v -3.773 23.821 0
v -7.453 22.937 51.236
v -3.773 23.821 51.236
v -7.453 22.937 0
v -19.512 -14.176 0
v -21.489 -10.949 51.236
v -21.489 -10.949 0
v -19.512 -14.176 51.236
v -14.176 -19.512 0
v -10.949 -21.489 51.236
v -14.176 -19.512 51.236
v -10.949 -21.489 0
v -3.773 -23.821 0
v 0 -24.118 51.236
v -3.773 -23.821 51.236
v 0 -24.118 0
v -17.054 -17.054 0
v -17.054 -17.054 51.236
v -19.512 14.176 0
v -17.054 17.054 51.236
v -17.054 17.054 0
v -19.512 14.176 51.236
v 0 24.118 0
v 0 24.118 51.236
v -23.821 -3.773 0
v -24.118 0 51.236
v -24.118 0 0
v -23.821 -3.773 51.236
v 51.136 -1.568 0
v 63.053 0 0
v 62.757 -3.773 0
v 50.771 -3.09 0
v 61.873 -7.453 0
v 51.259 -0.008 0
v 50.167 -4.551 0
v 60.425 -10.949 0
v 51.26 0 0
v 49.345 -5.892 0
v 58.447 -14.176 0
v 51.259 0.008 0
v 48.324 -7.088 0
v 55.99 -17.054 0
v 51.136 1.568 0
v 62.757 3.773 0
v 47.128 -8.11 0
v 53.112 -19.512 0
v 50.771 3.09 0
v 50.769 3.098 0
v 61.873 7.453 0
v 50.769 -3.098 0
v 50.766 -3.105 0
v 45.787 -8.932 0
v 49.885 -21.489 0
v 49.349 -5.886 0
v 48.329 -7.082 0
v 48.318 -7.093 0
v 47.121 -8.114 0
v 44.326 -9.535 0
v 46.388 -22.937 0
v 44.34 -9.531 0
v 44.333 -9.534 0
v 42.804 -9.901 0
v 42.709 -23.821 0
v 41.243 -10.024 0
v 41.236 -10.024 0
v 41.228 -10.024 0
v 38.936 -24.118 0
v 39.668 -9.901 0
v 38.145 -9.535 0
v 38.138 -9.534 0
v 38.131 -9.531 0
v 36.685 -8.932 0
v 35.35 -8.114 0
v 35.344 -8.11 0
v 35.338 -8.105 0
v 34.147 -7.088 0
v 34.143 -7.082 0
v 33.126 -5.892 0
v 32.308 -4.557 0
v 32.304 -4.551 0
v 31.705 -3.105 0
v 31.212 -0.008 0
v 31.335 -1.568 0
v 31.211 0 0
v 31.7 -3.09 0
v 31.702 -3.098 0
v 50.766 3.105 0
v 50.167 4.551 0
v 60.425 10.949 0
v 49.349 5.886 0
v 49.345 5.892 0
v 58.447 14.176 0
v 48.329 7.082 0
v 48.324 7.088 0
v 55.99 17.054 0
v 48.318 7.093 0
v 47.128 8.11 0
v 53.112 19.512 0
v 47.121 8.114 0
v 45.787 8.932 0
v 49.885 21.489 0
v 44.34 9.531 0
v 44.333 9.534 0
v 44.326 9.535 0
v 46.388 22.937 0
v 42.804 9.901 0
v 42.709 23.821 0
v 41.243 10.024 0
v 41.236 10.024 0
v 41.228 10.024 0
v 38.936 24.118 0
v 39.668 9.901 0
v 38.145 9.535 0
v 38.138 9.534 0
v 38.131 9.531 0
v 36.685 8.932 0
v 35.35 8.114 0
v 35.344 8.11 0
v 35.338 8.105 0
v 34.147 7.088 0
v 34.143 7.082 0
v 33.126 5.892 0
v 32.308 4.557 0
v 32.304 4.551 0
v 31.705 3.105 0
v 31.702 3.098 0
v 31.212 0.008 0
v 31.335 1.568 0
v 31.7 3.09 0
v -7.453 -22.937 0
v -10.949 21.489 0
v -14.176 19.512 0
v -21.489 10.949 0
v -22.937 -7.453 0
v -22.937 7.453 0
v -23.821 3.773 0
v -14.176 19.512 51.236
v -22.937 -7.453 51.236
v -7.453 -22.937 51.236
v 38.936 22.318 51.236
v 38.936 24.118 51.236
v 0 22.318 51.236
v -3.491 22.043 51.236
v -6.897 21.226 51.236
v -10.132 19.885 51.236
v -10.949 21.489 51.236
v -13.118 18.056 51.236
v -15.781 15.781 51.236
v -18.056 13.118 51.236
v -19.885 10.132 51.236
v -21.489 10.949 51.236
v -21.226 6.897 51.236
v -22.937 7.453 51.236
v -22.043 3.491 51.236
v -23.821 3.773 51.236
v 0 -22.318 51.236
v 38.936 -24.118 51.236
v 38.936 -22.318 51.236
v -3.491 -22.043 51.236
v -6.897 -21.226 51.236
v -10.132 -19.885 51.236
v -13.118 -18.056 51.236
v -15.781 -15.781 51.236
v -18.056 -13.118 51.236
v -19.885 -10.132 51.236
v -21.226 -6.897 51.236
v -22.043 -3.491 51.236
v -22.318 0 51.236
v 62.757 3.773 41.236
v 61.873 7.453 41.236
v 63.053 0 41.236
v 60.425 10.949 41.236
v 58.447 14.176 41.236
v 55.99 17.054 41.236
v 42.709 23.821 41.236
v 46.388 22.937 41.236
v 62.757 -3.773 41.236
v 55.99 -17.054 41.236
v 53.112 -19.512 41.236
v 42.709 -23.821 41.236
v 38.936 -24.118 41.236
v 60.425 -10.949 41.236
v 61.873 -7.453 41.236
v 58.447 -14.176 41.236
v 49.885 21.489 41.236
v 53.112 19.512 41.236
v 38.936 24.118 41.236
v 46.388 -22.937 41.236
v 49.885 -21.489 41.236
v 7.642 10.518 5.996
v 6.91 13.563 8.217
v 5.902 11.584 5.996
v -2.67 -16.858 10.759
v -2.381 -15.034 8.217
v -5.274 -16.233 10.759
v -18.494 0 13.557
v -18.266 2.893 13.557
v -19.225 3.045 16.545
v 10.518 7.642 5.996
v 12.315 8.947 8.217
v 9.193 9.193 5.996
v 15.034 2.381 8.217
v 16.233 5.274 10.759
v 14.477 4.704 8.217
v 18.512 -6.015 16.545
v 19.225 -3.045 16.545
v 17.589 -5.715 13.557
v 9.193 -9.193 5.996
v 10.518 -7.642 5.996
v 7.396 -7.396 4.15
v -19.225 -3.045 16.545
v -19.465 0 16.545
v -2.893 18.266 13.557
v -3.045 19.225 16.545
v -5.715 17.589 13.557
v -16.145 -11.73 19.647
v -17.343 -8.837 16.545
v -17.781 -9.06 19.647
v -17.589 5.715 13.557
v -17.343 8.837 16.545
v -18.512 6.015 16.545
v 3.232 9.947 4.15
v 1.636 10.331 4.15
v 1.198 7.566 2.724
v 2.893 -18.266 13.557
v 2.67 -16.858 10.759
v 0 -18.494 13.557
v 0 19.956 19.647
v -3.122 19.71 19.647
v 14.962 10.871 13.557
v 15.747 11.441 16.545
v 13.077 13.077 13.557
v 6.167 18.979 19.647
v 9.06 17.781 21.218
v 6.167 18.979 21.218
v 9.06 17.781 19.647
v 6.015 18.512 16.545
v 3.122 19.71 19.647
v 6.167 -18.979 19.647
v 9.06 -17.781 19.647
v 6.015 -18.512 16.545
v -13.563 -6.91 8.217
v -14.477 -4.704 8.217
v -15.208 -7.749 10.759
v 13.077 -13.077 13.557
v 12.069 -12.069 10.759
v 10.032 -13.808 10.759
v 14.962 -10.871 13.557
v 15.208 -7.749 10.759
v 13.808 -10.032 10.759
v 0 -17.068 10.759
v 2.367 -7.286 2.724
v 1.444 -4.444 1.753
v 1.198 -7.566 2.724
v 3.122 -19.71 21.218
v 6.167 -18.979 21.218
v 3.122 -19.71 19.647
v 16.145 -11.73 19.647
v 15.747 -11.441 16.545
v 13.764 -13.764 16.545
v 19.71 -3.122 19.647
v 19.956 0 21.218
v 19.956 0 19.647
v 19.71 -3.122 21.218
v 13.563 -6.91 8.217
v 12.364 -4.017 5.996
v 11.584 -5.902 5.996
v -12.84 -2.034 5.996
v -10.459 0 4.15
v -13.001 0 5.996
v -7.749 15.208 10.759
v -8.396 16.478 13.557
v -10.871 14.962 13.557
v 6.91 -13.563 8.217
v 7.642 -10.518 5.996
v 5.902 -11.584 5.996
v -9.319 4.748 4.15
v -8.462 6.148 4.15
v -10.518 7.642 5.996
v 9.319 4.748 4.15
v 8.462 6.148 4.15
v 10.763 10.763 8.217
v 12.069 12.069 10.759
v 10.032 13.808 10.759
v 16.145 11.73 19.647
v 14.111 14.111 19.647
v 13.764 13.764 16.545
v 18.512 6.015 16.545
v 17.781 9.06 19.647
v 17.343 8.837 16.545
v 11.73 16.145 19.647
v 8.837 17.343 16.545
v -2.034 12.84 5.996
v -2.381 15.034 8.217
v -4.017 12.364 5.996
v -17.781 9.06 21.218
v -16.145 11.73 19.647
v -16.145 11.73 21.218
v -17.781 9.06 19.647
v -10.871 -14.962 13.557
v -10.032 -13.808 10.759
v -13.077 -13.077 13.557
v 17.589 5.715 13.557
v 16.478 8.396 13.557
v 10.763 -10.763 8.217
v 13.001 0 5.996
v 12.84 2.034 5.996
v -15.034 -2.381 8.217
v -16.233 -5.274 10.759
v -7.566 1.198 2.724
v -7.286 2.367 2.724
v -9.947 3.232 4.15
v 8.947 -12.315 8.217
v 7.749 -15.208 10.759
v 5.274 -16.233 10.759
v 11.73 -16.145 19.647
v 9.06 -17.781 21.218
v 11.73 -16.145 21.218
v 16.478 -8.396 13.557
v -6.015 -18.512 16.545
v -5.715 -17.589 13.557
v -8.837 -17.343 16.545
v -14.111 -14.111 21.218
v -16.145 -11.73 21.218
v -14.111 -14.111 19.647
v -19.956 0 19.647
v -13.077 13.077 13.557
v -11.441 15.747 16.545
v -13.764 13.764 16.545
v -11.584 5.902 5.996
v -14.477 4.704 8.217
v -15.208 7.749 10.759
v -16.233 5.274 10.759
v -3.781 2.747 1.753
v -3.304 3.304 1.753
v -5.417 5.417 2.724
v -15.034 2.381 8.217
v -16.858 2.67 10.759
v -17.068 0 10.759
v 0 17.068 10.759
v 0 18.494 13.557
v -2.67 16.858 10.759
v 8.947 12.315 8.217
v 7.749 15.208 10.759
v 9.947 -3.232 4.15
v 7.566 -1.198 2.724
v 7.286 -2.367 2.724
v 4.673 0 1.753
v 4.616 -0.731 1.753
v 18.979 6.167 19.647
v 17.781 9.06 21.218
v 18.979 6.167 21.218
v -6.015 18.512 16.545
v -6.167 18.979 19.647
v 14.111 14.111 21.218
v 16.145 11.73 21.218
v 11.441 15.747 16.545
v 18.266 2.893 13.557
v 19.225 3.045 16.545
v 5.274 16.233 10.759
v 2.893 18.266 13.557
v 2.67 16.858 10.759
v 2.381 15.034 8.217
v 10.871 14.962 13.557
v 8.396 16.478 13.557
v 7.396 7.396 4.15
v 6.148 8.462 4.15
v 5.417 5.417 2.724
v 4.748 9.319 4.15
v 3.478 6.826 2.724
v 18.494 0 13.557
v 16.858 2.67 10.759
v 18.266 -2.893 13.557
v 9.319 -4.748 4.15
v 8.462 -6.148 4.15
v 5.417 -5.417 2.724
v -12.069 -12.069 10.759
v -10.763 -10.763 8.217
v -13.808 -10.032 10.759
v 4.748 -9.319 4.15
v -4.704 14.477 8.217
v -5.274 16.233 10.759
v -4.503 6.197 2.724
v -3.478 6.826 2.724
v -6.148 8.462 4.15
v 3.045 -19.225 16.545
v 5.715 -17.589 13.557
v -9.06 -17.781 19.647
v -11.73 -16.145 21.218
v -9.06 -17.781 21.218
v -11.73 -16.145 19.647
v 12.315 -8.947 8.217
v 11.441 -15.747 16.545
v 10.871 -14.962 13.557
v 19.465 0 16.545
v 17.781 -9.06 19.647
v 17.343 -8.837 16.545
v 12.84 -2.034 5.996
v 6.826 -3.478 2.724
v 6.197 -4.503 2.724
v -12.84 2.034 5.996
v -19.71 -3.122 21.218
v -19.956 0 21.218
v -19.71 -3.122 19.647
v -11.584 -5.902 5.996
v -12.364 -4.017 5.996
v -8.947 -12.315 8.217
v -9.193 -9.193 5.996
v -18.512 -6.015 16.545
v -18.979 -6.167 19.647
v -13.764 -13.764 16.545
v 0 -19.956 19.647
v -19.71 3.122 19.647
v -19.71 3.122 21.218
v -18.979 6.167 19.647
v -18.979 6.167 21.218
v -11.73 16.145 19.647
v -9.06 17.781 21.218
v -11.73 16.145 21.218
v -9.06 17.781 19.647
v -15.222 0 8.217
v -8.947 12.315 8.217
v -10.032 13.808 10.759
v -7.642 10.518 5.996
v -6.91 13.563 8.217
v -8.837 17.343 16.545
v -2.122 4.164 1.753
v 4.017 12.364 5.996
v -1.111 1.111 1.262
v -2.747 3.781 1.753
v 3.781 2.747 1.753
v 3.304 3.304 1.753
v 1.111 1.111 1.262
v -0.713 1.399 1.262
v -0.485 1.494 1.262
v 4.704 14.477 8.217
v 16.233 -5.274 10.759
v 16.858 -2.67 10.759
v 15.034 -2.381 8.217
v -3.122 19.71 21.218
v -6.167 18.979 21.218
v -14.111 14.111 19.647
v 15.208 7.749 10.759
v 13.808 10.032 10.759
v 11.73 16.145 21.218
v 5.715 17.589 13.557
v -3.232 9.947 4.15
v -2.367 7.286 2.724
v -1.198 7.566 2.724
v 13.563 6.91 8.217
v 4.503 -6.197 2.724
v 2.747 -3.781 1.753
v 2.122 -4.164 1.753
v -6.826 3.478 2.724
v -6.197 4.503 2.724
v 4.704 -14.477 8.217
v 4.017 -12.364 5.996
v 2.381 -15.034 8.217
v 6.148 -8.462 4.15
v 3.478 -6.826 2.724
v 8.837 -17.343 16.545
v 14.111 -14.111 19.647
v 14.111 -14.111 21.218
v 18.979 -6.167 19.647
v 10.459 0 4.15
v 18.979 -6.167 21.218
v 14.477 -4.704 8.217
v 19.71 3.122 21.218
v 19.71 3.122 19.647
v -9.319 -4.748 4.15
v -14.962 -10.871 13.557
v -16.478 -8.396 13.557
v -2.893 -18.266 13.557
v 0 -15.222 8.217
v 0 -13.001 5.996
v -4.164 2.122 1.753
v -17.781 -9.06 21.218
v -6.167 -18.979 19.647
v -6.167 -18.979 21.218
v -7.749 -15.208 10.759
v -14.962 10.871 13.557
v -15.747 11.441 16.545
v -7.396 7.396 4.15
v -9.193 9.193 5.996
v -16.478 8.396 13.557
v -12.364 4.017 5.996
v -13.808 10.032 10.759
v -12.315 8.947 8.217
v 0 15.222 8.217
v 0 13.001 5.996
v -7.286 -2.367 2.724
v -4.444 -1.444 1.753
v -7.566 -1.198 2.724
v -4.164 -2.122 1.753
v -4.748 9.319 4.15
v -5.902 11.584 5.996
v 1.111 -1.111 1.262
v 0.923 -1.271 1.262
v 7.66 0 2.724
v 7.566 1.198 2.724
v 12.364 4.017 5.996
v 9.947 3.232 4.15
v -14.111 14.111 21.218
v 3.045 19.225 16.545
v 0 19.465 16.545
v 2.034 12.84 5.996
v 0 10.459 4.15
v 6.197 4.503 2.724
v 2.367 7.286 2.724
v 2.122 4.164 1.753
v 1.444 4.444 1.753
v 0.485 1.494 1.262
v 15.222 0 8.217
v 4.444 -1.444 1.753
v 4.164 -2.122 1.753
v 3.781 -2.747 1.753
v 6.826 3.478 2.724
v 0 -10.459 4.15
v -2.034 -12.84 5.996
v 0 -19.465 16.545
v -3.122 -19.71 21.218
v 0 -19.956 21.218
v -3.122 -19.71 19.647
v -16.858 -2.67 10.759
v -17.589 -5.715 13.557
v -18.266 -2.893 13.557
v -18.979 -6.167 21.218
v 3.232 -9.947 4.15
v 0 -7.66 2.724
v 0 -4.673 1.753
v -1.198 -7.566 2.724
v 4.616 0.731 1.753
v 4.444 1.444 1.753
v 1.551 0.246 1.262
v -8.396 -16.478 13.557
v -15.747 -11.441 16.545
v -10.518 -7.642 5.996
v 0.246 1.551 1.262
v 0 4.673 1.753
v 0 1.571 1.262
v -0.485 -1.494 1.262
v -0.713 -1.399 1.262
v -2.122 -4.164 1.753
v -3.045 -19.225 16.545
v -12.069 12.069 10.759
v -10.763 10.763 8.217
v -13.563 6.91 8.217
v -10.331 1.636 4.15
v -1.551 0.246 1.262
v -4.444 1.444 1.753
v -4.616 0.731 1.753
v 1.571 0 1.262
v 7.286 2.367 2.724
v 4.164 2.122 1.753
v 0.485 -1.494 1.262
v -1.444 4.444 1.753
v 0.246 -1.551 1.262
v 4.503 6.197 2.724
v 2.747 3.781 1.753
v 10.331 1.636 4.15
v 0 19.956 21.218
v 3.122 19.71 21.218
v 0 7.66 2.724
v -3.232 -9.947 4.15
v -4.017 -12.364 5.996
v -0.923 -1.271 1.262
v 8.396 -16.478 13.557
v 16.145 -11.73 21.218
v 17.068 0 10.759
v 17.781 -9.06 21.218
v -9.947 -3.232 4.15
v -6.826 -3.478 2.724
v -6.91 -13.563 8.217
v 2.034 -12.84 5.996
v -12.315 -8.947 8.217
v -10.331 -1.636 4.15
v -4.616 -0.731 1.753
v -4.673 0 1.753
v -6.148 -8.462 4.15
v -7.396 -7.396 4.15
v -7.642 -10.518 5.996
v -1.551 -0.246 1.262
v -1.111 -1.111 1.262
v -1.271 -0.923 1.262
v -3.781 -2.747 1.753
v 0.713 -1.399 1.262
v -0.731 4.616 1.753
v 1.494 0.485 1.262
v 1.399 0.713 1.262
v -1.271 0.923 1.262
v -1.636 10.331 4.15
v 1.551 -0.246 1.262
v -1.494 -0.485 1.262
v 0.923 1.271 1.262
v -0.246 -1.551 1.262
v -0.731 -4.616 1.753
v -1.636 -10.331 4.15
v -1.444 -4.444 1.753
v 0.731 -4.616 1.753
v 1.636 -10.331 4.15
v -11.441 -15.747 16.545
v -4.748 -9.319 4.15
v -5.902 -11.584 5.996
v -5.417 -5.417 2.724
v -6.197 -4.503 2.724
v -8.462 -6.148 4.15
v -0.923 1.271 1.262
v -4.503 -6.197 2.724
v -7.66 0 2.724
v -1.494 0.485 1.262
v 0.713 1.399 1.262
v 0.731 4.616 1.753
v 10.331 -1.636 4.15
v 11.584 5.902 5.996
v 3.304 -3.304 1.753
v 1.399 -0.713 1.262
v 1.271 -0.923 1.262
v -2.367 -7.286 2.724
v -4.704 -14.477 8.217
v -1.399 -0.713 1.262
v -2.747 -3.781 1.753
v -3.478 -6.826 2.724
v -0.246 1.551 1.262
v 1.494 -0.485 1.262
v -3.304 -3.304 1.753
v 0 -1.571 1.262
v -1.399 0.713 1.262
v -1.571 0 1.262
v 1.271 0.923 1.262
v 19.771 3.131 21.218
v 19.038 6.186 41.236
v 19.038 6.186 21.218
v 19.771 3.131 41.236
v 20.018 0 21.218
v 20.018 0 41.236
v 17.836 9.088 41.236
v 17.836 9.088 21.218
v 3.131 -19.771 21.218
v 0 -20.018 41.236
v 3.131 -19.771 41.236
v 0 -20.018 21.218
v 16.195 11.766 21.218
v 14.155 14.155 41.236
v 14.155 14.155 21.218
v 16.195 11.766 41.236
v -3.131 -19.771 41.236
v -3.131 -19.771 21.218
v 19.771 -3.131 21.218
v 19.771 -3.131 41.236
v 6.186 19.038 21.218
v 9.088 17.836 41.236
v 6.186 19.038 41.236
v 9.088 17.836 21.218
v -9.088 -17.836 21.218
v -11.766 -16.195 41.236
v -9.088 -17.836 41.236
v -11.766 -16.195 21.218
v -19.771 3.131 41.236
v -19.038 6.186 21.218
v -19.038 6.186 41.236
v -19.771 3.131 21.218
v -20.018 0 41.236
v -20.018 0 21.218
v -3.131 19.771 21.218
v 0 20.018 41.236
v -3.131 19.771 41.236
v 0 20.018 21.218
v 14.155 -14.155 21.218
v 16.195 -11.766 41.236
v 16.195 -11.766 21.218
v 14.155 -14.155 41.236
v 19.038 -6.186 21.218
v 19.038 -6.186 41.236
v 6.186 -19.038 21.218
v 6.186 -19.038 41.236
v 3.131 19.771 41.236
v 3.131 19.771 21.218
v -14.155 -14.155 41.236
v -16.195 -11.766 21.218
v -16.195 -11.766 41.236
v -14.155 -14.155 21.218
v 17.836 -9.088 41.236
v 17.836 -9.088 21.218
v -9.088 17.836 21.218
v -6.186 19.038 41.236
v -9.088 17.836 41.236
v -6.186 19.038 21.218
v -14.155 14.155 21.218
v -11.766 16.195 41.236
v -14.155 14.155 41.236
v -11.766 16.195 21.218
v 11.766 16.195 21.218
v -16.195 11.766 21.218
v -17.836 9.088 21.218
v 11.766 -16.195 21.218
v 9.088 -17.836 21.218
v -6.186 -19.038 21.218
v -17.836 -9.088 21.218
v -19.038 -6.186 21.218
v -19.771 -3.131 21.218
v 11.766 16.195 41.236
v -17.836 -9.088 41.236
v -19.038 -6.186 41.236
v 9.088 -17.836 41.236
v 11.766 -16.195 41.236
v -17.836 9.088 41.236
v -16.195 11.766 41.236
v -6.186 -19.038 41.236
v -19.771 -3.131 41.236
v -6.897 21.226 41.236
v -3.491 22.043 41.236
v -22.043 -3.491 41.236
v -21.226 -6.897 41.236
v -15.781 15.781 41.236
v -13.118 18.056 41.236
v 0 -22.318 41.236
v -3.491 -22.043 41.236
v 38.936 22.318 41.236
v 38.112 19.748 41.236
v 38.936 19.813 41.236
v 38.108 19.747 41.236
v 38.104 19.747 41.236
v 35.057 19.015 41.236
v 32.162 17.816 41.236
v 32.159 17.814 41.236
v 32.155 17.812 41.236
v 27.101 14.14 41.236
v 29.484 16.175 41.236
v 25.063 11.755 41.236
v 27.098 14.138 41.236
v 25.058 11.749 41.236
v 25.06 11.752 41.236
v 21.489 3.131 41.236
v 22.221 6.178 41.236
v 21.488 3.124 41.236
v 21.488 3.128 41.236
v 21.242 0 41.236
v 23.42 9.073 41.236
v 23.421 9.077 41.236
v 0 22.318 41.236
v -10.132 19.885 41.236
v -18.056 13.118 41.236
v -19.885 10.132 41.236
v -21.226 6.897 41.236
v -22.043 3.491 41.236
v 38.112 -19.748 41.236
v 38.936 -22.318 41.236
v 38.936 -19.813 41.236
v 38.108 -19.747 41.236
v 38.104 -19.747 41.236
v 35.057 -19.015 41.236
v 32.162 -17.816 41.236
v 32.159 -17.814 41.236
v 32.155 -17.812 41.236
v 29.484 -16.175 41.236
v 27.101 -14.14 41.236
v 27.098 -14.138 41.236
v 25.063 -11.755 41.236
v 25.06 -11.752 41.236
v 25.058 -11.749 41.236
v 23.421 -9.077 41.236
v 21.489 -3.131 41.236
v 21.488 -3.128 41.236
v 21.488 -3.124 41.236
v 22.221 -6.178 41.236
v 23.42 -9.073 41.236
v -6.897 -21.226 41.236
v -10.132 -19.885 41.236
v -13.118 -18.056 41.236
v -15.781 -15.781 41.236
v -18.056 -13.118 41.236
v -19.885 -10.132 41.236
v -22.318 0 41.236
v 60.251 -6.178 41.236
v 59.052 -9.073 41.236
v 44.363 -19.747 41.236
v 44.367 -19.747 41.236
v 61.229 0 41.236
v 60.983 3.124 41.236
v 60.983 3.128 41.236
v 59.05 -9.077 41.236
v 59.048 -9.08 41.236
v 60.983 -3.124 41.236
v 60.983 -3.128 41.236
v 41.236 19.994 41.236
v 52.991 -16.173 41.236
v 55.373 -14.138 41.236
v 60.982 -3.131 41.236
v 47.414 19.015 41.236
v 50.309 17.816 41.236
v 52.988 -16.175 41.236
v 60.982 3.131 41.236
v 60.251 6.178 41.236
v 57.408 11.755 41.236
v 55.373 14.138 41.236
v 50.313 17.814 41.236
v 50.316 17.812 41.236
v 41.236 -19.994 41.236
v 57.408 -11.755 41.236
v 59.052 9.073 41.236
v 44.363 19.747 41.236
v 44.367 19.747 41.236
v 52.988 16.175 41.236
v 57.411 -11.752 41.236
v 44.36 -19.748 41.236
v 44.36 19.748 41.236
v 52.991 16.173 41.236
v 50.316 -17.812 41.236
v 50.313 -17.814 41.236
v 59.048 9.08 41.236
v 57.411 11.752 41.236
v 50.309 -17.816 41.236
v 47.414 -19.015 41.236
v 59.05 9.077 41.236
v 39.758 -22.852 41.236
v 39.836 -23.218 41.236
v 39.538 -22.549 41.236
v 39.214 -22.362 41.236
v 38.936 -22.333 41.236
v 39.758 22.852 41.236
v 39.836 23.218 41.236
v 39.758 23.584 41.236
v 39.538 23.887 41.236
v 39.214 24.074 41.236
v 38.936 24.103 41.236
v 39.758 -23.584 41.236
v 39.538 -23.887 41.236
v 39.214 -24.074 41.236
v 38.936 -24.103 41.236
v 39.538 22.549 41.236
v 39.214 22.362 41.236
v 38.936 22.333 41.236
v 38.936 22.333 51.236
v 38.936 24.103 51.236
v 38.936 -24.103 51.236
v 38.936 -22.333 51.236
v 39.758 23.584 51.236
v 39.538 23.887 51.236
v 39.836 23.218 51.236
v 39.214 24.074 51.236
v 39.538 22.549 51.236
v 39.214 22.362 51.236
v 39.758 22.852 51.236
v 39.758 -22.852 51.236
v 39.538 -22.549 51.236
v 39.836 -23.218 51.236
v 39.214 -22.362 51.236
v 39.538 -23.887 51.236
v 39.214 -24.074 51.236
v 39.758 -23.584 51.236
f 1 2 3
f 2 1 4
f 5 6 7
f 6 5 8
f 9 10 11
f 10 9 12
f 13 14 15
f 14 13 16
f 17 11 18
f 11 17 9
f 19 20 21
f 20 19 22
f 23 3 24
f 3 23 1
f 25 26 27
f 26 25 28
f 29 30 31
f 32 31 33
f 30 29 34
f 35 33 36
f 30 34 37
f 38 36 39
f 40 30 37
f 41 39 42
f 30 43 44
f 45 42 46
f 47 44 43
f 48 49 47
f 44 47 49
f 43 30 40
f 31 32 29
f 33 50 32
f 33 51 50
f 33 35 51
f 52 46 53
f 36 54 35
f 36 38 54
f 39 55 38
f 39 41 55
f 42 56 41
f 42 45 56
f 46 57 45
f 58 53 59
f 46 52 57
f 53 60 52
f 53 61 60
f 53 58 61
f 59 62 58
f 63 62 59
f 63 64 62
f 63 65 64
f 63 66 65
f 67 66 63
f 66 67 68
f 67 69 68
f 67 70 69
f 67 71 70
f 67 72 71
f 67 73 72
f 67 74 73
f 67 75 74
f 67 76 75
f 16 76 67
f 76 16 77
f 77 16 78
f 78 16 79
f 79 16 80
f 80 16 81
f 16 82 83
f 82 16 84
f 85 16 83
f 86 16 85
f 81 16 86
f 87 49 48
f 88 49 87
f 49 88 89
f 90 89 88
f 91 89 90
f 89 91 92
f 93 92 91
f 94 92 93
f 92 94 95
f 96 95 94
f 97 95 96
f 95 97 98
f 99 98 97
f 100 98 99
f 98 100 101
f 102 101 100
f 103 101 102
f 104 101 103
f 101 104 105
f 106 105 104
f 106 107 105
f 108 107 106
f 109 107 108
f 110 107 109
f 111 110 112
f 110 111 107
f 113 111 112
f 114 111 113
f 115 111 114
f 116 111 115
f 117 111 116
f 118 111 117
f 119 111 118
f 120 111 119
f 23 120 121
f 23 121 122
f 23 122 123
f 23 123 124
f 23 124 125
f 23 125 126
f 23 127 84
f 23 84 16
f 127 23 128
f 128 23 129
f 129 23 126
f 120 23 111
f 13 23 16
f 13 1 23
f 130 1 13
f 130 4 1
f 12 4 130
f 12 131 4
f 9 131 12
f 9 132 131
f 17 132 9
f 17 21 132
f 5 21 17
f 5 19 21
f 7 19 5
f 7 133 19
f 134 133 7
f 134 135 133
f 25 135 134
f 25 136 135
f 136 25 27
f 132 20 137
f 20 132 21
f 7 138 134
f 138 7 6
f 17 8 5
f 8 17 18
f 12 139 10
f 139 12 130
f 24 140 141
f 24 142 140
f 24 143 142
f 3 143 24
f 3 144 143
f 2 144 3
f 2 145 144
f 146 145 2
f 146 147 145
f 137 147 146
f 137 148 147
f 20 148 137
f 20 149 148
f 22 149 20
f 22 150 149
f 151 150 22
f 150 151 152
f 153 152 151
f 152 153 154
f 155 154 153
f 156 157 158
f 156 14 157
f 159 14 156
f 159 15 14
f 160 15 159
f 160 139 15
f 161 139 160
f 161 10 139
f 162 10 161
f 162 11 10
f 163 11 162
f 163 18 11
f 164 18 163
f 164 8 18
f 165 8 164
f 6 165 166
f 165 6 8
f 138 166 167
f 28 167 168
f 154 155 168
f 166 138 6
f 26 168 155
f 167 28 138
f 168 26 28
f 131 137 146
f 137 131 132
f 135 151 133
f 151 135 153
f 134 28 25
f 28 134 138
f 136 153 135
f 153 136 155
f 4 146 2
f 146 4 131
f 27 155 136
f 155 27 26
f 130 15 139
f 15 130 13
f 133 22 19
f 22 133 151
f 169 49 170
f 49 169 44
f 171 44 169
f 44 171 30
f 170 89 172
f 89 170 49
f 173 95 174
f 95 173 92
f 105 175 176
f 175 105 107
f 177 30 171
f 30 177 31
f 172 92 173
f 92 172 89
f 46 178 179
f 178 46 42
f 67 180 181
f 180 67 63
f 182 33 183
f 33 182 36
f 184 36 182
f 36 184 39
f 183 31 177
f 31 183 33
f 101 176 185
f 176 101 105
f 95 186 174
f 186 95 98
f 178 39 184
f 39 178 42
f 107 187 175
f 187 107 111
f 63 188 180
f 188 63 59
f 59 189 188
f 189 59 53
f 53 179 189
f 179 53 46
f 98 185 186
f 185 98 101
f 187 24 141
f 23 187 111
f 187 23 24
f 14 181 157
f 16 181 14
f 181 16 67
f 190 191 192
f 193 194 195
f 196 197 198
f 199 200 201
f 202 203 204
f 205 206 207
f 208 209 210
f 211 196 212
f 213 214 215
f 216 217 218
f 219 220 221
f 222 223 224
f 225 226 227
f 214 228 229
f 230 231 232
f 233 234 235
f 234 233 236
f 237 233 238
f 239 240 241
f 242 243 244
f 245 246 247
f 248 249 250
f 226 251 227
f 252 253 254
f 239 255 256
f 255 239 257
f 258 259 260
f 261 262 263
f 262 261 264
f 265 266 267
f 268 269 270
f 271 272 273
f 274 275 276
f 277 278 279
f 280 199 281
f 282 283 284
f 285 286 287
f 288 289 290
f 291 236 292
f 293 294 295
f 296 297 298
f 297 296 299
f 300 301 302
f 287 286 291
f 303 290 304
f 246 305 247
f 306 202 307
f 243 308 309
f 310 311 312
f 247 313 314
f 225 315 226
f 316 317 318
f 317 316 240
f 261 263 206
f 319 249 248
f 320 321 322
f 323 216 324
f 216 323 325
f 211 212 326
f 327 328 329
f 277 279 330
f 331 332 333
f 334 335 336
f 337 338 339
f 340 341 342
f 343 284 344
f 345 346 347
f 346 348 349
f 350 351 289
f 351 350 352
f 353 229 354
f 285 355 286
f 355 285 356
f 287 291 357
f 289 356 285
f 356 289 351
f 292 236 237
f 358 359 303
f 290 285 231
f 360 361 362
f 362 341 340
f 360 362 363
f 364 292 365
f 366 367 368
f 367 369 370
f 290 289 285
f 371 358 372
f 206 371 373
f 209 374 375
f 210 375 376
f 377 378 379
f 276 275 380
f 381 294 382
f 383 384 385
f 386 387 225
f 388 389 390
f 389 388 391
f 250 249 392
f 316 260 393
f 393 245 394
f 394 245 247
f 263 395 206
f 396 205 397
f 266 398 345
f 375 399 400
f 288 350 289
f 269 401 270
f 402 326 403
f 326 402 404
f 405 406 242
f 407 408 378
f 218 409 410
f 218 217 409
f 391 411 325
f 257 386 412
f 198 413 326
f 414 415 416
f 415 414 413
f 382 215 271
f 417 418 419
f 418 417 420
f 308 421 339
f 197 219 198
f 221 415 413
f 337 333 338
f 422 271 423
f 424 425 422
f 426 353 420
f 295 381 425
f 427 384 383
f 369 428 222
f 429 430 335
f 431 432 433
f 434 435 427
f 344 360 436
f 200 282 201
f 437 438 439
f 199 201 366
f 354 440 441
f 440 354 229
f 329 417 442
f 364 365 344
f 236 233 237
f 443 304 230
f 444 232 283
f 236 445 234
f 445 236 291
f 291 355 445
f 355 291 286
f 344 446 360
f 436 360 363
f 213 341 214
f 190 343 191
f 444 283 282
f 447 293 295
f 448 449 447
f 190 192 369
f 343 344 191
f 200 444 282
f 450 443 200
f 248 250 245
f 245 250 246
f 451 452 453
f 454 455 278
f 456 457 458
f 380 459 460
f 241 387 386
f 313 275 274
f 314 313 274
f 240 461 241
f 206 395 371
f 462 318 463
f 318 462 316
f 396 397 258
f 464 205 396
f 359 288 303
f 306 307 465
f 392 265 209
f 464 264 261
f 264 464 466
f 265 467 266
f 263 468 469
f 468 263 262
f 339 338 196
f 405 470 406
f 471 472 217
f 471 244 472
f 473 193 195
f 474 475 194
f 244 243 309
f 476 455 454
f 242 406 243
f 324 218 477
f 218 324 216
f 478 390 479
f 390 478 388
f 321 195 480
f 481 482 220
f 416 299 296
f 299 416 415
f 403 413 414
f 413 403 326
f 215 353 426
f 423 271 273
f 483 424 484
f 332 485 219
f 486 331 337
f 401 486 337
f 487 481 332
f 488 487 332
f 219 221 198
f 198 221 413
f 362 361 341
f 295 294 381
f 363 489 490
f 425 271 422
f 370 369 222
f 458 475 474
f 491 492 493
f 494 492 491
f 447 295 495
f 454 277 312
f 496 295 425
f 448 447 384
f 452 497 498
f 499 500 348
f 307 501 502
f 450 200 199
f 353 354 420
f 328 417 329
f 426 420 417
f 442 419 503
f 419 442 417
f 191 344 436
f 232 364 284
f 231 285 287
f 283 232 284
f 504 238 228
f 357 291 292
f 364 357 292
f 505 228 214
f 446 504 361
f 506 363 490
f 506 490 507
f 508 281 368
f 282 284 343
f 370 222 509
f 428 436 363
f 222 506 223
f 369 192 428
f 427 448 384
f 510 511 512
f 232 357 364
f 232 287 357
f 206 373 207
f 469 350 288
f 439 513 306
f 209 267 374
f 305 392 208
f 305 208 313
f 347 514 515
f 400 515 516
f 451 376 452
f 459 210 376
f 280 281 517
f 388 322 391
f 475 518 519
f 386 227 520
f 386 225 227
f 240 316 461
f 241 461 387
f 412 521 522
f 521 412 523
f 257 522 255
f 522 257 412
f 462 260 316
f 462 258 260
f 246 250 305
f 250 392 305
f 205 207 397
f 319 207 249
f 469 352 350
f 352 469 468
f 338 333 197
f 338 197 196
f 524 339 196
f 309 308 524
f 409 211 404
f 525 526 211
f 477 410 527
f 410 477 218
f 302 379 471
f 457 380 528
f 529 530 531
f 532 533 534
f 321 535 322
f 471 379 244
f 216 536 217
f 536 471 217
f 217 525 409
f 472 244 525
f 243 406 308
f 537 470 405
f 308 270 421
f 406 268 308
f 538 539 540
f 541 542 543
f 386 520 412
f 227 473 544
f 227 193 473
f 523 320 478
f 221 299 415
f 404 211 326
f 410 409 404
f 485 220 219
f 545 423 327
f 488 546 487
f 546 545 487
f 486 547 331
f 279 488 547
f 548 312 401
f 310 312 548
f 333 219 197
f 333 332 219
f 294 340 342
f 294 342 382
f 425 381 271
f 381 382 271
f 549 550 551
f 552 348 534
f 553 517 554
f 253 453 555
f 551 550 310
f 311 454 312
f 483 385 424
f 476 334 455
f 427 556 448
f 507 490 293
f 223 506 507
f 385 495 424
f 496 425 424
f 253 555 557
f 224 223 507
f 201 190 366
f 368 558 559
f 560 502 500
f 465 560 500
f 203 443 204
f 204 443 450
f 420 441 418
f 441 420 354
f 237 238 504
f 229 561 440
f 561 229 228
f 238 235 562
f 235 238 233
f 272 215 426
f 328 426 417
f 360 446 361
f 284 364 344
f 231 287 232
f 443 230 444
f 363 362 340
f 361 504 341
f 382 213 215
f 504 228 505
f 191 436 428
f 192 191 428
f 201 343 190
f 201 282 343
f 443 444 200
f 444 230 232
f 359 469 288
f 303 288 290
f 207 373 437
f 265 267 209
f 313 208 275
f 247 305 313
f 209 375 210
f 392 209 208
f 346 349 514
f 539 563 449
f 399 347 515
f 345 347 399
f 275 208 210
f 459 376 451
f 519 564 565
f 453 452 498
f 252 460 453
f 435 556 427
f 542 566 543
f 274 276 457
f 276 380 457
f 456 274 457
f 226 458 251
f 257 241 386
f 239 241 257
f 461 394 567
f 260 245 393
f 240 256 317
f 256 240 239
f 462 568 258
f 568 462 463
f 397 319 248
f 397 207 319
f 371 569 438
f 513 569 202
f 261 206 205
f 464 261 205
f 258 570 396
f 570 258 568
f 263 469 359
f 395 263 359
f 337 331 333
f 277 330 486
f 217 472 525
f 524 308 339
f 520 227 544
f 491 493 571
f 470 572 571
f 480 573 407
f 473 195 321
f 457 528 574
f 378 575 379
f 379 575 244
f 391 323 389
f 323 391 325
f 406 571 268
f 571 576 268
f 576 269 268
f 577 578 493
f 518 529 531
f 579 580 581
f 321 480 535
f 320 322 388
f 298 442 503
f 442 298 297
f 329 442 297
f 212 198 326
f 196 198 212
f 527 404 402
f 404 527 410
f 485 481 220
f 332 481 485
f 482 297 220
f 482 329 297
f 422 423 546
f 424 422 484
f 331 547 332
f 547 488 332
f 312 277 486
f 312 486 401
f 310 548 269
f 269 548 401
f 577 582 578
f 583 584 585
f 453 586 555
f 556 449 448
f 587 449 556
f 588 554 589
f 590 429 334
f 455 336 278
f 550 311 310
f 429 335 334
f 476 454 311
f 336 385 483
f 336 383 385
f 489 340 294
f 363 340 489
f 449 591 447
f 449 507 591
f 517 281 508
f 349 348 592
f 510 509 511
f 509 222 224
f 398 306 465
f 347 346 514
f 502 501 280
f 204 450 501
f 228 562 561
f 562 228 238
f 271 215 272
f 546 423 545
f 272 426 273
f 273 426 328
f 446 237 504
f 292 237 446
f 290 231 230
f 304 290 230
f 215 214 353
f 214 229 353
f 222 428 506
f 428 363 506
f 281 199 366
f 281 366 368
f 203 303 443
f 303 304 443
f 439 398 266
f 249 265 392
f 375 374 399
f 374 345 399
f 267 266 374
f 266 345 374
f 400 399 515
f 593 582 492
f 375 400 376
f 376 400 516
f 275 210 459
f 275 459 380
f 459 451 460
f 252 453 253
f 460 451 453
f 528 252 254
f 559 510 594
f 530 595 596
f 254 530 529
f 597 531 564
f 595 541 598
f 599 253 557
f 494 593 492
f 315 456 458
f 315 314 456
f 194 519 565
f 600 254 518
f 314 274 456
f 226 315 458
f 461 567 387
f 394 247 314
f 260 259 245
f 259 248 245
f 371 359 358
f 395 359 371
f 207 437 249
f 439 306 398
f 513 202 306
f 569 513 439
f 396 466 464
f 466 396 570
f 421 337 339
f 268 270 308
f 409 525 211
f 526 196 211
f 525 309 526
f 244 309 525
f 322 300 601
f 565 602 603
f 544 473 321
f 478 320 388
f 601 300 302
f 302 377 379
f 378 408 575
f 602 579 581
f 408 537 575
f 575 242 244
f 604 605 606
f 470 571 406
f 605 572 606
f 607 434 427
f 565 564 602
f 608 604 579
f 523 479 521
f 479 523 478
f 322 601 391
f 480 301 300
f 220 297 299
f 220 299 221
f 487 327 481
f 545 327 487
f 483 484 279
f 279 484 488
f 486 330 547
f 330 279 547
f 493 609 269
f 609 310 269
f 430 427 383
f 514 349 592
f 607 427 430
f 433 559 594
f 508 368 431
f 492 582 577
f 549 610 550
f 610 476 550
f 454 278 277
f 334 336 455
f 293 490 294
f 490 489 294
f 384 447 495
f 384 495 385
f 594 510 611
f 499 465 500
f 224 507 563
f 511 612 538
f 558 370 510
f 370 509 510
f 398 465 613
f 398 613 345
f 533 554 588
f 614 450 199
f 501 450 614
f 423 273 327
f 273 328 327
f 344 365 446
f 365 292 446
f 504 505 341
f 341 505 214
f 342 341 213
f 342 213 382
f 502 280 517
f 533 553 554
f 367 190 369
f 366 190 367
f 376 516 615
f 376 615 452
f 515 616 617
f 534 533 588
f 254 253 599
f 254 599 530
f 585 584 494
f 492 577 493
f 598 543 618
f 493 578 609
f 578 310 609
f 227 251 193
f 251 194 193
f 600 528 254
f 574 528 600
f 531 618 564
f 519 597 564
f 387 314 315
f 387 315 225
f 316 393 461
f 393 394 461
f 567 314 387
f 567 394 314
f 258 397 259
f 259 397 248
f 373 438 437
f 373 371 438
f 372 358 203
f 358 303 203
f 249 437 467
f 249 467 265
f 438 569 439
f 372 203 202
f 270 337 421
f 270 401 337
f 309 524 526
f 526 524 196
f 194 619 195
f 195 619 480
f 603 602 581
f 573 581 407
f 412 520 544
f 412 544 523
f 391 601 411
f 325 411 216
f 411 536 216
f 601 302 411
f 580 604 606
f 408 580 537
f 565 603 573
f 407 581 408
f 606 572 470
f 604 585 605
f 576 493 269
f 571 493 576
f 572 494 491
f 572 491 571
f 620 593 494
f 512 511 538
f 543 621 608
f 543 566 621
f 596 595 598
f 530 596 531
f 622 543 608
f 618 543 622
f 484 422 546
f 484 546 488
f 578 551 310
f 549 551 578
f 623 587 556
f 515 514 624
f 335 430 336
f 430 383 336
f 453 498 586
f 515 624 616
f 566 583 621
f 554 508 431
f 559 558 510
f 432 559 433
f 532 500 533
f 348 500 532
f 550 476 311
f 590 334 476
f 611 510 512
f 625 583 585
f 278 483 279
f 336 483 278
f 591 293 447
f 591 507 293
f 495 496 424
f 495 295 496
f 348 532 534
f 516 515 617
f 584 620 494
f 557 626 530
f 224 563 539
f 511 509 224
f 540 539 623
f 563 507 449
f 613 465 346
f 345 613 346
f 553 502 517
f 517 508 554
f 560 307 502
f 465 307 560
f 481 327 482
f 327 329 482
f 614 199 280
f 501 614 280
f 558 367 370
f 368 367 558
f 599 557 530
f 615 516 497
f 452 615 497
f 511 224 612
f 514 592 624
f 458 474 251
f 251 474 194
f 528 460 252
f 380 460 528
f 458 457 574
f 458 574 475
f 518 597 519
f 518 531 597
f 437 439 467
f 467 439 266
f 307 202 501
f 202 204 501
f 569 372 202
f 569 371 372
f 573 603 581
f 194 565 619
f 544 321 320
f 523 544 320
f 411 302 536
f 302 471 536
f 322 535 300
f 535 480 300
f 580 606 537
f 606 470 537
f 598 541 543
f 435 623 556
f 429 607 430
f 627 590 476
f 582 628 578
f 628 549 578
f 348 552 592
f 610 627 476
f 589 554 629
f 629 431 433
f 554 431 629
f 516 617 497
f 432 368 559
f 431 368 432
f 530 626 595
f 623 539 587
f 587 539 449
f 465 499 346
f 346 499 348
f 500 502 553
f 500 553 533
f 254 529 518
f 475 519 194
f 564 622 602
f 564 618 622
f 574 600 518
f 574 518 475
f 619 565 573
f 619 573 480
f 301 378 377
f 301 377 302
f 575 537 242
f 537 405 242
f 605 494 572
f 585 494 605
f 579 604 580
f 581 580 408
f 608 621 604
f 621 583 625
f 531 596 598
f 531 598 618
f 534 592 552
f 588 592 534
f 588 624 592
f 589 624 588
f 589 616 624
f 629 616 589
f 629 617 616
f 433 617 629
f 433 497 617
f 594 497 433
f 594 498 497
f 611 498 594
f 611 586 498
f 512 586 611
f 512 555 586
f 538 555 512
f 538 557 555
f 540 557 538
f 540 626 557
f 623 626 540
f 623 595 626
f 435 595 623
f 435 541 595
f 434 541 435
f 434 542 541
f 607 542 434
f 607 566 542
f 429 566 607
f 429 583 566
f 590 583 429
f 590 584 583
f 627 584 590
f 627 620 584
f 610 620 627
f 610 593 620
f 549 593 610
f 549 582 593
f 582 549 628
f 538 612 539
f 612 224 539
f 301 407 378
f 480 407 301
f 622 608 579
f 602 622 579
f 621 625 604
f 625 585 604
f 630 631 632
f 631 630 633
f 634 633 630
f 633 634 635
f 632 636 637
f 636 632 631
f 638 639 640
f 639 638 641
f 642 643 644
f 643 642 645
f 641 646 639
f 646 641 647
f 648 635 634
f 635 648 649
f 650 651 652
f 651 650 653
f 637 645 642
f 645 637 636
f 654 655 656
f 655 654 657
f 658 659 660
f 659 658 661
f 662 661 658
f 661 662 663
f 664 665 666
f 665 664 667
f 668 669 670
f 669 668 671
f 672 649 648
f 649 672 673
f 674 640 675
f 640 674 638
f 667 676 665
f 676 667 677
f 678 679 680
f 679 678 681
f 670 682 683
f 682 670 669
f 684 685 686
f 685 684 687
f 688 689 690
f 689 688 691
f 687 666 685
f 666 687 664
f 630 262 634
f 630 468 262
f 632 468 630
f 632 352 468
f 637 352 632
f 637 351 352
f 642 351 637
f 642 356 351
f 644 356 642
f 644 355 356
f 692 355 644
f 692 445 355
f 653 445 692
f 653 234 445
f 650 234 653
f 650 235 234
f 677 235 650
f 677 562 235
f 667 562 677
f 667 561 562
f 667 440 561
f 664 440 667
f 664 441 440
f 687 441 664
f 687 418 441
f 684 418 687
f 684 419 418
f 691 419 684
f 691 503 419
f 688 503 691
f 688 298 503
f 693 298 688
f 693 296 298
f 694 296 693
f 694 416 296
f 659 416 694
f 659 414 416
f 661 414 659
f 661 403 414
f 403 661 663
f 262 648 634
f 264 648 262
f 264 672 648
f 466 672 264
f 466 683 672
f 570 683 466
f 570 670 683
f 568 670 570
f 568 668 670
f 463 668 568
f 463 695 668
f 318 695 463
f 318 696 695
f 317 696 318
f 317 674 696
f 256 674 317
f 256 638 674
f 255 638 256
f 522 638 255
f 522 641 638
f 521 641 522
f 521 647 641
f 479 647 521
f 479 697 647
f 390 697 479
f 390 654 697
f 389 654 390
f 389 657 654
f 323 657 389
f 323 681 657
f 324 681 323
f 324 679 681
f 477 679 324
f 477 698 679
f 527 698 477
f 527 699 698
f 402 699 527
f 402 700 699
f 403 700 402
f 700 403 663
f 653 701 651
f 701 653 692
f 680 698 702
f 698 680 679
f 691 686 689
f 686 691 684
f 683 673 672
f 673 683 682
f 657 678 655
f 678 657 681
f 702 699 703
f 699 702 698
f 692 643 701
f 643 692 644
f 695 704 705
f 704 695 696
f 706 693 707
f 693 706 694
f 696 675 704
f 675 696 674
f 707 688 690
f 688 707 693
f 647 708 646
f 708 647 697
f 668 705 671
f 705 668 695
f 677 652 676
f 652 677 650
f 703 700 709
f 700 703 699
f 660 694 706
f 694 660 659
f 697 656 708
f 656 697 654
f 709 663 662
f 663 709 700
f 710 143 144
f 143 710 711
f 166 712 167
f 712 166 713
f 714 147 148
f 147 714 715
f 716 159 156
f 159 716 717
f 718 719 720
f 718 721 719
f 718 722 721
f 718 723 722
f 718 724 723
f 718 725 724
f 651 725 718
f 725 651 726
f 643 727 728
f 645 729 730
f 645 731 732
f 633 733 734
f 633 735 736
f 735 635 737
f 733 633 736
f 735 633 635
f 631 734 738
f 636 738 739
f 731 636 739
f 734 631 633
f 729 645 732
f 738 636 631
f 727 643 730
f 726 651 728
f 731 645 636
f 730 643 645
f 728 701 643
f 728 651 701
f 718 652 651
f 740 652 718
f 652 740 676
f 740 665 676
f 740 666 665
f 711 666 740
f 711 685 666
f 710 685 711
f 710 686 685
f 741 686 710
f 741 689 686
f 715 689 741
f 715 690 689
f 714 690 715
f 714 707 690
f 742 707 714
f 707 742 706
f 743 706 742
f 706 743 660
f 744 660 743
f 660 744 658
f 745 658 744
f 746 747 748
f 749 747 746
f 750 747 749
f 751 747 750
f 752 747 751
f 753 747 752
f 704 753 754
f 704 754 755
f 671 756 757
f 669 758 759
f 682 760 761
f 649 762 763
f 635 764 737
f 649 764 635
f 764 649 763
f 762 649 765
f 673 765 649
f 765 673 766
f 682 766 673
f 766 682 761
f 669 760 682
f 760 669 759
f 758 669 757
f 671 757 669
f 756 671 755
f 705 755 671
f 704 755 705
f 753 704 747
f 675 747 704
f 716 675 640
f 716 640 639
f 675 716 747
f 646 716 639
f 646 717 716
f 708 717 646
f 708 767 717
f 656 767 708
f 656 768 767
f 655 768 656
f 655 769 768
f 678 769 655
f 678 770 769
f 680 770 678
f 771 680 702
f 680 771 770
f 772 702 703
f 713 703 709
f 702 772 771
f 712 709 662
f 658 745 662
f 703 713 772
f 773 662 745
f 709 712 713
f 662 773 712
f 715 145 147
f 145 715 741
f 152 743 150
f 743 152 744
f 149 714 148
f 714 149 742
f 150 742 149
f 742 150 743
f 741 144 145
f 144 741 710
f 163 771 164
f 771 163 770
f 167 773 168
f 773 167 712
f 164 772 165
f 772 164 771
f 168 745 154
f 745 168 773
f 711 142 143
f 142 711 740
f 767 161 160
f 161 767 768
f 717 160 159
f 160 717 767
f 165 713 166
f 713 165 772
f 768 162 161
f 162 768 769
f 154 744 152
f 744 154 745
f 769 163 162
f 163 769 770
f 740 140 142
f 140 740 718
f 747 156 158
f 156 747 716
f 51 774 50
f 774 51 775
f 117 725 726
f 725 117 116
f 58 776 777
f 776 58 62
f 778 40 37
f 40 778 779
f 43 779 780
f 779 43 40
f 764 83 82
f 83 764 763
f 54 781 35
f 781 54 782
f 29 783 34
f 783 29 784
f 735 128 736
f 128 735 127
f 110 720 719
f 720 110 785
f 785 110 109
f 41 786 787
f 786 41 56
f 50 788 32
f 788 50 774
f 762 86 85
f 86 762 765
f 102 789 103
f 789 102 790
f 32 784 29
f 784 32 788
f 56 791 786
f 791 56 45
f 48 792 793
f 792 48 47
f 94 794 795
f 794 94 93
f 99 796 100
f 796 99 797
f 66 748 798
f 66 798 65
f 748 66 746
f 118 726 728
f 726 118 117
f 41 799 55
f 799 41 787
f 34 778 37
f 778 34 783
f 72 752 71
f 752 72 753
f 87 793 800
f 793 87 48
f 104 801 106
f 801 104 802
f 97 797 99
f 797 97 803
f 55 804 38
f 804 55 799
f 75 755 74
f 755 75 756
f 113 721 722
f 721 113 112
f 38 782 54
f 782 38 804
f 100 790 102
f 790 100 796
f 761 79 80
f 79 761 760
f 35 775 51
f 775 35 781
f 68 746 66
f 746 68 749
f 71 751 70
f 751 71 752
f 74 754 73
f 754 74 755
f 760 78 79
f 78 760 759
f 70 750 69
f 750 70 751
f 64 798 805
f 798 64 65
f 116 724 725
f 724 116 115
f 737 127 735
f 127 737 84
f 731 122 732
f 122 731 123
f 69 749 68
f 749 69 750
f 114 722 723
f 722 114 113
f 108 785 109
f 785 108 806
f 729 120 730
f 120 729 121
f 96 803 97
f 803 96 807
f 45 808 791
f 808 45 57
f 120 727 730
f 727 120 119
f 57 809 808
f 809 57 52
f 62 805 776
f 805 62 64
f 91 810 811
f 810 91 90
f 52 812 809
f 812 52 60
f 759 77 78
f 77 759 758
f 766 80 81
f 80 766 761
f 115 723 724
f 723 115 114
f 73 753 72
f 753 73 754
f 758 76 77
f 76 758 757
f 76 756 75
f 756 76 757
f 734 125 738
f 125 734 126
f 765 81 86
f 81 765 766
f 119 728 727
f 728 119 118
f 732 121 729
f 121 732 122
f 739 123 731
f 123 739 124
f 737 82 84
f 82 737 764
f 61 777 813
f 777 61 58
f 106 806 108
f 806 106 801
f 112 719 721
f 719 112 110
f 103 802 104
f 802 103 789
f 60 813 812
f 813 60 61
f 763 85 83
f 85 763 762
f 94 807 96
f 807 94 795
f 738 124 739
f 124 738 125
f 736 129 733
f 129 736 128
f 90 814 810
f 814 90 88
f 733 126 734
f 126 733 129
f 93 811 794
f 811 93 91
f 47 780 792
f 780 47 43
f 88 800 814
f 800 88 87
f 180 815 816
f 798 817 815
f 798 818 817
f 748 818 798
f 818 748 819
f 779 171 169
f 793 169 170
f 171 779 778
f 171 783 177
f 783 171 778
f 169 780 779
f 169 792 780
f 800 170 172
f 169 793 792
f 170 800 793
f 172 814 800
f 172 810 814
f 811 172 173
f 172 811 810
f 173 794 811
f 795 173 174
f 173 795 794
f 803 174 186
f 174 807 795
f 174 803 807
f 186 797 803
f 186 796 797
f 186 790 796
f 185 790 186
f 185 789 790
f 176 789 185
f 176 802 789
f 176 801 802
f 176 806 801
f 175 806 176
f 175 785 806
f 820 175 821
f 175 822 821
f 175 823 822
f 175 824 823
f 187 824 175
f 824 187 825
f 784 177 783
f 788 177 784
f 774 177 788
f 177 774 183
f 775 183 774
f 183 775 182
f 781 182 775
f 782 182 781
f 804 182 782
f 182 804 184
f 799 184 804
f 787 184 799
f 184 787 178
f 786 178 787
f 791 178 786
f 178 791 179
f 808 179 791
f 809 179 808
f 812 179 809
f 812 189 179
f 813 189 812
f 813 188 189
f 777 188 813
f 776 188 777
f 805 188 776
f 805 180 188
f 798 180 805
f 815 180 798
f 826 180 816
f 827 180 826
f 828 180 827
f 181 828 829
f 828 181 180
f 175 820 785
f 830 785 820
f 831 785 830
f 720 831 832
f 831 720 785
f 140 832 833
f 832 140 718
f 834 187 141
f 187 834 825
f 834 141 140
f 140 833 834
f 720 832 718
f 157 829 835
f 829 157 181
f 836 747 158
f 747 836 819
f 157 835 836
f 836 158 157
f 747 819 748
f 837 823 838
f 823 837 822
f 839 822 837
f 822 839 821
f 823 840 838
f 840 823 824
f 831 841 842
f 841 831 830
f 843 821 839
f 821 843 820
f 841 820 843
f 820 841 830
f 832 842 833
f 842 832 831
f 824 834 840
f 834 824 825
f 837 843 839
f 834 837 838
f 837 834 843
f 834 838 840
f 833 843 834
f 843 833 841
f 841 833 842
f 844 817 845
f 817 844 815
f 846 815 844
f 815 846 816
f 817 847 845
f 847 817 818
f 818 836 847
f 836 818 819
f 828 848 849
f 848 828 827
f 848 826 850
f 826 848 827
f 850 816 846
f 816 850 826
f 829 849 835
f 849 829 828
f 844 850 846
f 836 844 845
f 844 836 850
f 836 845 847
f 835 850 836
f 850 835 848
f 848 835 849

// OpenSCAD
// -*- mode: SCAD ; c-file-style: "ellemtel" ; coding: utf-8 -*-
//
// Another tea portioner.
//
// The same pot, funnel and striker, and chute principle as the first, but
// using a number of design lessons i've since learned, and some new ideas.
//
// Copyright 2017 - 2018 Roland Sieker <ospalh@gmail.com>
// Licence: CC-BY-SA 4.0

// ... to preview. You will get all three parts when you click "Create Thing".
part = "portioner"; // [portioner: portioner cup, funnel: funnel/striker, stand: stand]

// Cubic centimetres
volume = 42;  // [8:1:150]
// Set this to "render" and click on "Create Thing" when done with the setup.
preview = 1; // [0:render, 1:preview]

// Size of the stand. Set this to 0 to just get a tray to keep the portioner clean for the striking. In mm.
stand_diameter = 80;  // [0:1:100]

// Size of the funnel at the top. Adjust this to how good your tea tossing aim is. :)  In mm.
funnel_diameter = 90;  // [30:1:120]

/* [Hidden] */

// *******************************************************
// Some more values that can be changed

h_in_r = 1;  // Height of the cylinder in radiuses. Tweaked by hand

w = 1.8;  // wall width for the horizontal flanges
p = 1.2;  // height of the bottomt plate
w_i = 1.2;  // Internal wall width. The bit between the two circular holes
w_f = 1.8;  // Wall for the funnel. I had some problems with varying wall widths, but fixed it otherwise.
stand_height = 15;
flange_height = 10;
stand_peg_height = 2;

chute_limit_diameter = 20;  // Make a hole at least this big
chute_limit_factor = 0.3;  // ... or at least this part of the top hole

ms = 0.1;  // Muggeseggele.

clearance = 0.5;  // mm for the parts that should fit into each other

funnel_angle = 60;  //

// *******************************************************
// Some shortcuts. These shouldn't be changed

tau = 2 * PI;  // pi is still wrong. tau = circumference/r

// Somewhat comprehensible math to get r from V
// V = 1/2 (V sphere) + V cylinder
// V = 1/2 * (2tau r^2 * 1/3 r) + 1/2 tau r^2 * h
//
// (The V = 2tau/3 * r^2 can be split in 2tau r^2 * 1/3 r: think of infinitesimal
// pyramids with the base area of the surface area of a sphere, 2tau r^2, and
// the Volume of base area * 1/3 h, with h = r.)
// (Similarly, the area of a circle can be seen as a rectangle of
// infinitesimal circle sectors, with the outer bit alternatively at the
// top and bottom. That gives the area as r * 1/2 circumference, or r *
// 1/2tau r. No argument against tau or for pi.)
//

r_cm = pow(volume/(tau/3+tau/2*h_in_r),1/3);
r = r_cm * 10;  // Volume is done in ml, the rest of OpenSCAD uses mm.
// (And you don't uses mm^3 a.k.a. microlitre in everyday settings.)

r_1 = r + w_f;  // outer diameter, striker
r_2 = r_1 + clearance; // inner size of the measuring cup flange
r_3 = r_2 + w; // outer size of the measuring cup
r_4 = r_3 + clearance;  // inner size of the stand tray
r_5 = r_4 + w;  // outer size of the stand tray

d_cc = 2*r + w_i;  // distance cylinder cylinder

r_cb_i = max(r*chute_limit_factor, chute_limit_diameter/2);
r_cb = min(r_cb_i, r);
r_cb_0 = r_cb - clearance;

r_f = funnel_diameter/2;
d_ftb = r_f-r_1;
h_f = d_ftb / tan(90-funnel_angle);  // Funnel height
h_fg = flange_height+clearance;  // funnel grip height

some_distance = max(2*r_5,stand_diameter/2+r_3) + 10;

// fn for differently sized objects, for preview or rendering.
pfa = 40;
pfb = 15;
rfa = 180;
rfb = 30;
function fa() = (preview) ? pfa : rfa;
function fb() = (preview) ? pfb : rfb;

// *******************************************************
// End setup



// *******************************************************
// Generate the parts

print_part();
// preview_parts();
// stack_parts();

// I used this cylinder as a modifier to set the infill to higher
// values under the central bit of the portioner sphere, to get less
// sag.
// cylinder(r=0.7*r, h=r,$fn=fa());


module print_part()
{
   if ("portioner" == part)
   {
      portioner();
   }
   if (part == "funnel")
   {
      funnel();
   }
   if (part == "stand")
   {
      stand();
   }
}

module preview_parts()
{
   portioner();
   translate([r_4+d_cc+funnel_diameter/2+10, 0, 0])
   {
      funnel();
   }
   translate([0, some_distance, 0])
   {
      stand();
   }
}

module stack_parts()
{
   // intersection()
   {
      color("yellow")
      {
         stand();
      }
      translate([0,0,w+2*ms])
      {
         color("red")
         {
            portioner();
         }
      }
      translate([0,0,w+2*ms + r*(h_in_r + 1) + w + ms ])
      {
         color("black")
         {
            funnel();
         }
      }
   }
}

// *******************************************************
// Code for the parts themselves


module portioner()
{
   difference()
   {
      portioner_body();
      portioner_hollow();
   }
   translate([d_cc-w-clearance, 0, (1+h_in_r)*r])
   {
      translate([0, r_2+w/2, 0])
      {
         cylinder(d=w, h=flange_height+p, $fn=fb());
      }
      translate([0, -r_2-w/2, 0])
      {
         cylinder(d=w, h=flange_height+p, $fn=fb());
      }
   }
}


module funnel()
{
   difference()
   {
      funnel_body();
      funnel_hollow();
   }

   translate([d_cc, 0, 0])
   {
      translate([0, r+w_f/2, 0])
      {
         cylinder(d=w_f, h=h_fg+ms, $fn=fb());
      }
      translate([0, -r-w_f/2, 0])
      {
         cylinder(d=w_f, h=h_fg+ms, $fn=fb());
      }
   }

}


module stand()
{
   difference()
   {
      union()
      {
         stand_base();
         ccc(r_5, stand_height, w+clearance, 0);
      }
      ccc(r_4, stand_height, w+clearance, p+ms);
   }
   translate([d_cc, 0, p])
   {
      cylinder(r=r_cb_0, h=stand_peg_height, $fn=fa());
   }
}

module portioner_body()
{
   ccc(r_3, r*(h_in_r+1)+p+flange_height, w+clearance, 0);
}


module portioner_hollow()
{
   // Measuring hollow
   translate([0, 0, r+p])
   {
      sphere(r=r, $fn=fa());
      cylinder(r=r, h = r*h_in_r + ms, $fn=fa());
   }
   // chute
   translate([d_cc, 0, -ms])
   {
      cylinder(r1=r_cb, r2=r, h=r*(h_in_r+1)+p + 2*ms, $fn=fa());
   }
   // funnel flange hollow
   ccc(r_2, flange_height+ms, w+clearance, r*(h_in_r+1)+p);
   translate([0,0,0])
   {
      translate([d_cc-w-clearance, -r_5, r*(h_in_r+1)+p])
      {
          cube([2*r_2, 2*r_5, flange_height+ms]);
      }
   }
}


module funnel_body()
{
   // almost a ccc, w/o the last cylinder
   cylinder(r=r_1, h=h_fg+ms, $fn=fa());
   translate([0, -r_1, 0])
   {
      cube([d_cc, 2*r_1, h_fg+ms]);
   }
   translate([0, 0, h_fg])
   {
      cylinder(r1=r_1, r2=funnel_diameter/2+w_f, h=h_f, $fn=fa());
   }
}


module funnel_hollow()
{
   translate([0, 0, -ms])
   {
      cylinder(r=r, h=flange_height+clearance+3*ms, $fn=fa());
   }
   translate([0, 0, flange_height+clearance])
   {
      // N.B.: now ms here. Necessary for a consistant wall width.
      cylinder(r1=r, r2=funnel_diameter/2, h=h_f, $fn=fa());
   }
   translate([d_cc, 0, -ms])
   {
      cylinder(r=r, h=flange_height+clearance+3*ms, $fn=fa());
   }
   // Just for the preview
   translate([0, 0, flange_height+clearance+h_f-ms])
   {
      cylinder(d=funnel_diameter-2*ms, h=2*ms, $fn=fa());
   }
}

module stand_base()
{
   translate([r+0.5*w, 0, 0])
   {
      cylinder(d=stand_diameter, h=p, $fn=fa());
      translate([0,0,p])
      {
         cylinder(d1=stand_diameter, d2=2*r_5, h=stand_height-w, $fn=fa());
      }
   }

}

module ccc(r_i, h_i, o_x, o_z)
{
   // The cylinder cube cylinder combo used several times
   translate([0,0, o_z])
   {
      cylinder(r=r_i, h=h_i, $fn=fa());
      translate([d_cc-o_x, 0, 0])
      {
         cylinder(r=r_i, h=h_i, $fn=fa());
      }
      translate([0, -r_i, 0])
      {
         cube([d_cc-o_x, 2*r_i, h_i]);
      }
   }
}
